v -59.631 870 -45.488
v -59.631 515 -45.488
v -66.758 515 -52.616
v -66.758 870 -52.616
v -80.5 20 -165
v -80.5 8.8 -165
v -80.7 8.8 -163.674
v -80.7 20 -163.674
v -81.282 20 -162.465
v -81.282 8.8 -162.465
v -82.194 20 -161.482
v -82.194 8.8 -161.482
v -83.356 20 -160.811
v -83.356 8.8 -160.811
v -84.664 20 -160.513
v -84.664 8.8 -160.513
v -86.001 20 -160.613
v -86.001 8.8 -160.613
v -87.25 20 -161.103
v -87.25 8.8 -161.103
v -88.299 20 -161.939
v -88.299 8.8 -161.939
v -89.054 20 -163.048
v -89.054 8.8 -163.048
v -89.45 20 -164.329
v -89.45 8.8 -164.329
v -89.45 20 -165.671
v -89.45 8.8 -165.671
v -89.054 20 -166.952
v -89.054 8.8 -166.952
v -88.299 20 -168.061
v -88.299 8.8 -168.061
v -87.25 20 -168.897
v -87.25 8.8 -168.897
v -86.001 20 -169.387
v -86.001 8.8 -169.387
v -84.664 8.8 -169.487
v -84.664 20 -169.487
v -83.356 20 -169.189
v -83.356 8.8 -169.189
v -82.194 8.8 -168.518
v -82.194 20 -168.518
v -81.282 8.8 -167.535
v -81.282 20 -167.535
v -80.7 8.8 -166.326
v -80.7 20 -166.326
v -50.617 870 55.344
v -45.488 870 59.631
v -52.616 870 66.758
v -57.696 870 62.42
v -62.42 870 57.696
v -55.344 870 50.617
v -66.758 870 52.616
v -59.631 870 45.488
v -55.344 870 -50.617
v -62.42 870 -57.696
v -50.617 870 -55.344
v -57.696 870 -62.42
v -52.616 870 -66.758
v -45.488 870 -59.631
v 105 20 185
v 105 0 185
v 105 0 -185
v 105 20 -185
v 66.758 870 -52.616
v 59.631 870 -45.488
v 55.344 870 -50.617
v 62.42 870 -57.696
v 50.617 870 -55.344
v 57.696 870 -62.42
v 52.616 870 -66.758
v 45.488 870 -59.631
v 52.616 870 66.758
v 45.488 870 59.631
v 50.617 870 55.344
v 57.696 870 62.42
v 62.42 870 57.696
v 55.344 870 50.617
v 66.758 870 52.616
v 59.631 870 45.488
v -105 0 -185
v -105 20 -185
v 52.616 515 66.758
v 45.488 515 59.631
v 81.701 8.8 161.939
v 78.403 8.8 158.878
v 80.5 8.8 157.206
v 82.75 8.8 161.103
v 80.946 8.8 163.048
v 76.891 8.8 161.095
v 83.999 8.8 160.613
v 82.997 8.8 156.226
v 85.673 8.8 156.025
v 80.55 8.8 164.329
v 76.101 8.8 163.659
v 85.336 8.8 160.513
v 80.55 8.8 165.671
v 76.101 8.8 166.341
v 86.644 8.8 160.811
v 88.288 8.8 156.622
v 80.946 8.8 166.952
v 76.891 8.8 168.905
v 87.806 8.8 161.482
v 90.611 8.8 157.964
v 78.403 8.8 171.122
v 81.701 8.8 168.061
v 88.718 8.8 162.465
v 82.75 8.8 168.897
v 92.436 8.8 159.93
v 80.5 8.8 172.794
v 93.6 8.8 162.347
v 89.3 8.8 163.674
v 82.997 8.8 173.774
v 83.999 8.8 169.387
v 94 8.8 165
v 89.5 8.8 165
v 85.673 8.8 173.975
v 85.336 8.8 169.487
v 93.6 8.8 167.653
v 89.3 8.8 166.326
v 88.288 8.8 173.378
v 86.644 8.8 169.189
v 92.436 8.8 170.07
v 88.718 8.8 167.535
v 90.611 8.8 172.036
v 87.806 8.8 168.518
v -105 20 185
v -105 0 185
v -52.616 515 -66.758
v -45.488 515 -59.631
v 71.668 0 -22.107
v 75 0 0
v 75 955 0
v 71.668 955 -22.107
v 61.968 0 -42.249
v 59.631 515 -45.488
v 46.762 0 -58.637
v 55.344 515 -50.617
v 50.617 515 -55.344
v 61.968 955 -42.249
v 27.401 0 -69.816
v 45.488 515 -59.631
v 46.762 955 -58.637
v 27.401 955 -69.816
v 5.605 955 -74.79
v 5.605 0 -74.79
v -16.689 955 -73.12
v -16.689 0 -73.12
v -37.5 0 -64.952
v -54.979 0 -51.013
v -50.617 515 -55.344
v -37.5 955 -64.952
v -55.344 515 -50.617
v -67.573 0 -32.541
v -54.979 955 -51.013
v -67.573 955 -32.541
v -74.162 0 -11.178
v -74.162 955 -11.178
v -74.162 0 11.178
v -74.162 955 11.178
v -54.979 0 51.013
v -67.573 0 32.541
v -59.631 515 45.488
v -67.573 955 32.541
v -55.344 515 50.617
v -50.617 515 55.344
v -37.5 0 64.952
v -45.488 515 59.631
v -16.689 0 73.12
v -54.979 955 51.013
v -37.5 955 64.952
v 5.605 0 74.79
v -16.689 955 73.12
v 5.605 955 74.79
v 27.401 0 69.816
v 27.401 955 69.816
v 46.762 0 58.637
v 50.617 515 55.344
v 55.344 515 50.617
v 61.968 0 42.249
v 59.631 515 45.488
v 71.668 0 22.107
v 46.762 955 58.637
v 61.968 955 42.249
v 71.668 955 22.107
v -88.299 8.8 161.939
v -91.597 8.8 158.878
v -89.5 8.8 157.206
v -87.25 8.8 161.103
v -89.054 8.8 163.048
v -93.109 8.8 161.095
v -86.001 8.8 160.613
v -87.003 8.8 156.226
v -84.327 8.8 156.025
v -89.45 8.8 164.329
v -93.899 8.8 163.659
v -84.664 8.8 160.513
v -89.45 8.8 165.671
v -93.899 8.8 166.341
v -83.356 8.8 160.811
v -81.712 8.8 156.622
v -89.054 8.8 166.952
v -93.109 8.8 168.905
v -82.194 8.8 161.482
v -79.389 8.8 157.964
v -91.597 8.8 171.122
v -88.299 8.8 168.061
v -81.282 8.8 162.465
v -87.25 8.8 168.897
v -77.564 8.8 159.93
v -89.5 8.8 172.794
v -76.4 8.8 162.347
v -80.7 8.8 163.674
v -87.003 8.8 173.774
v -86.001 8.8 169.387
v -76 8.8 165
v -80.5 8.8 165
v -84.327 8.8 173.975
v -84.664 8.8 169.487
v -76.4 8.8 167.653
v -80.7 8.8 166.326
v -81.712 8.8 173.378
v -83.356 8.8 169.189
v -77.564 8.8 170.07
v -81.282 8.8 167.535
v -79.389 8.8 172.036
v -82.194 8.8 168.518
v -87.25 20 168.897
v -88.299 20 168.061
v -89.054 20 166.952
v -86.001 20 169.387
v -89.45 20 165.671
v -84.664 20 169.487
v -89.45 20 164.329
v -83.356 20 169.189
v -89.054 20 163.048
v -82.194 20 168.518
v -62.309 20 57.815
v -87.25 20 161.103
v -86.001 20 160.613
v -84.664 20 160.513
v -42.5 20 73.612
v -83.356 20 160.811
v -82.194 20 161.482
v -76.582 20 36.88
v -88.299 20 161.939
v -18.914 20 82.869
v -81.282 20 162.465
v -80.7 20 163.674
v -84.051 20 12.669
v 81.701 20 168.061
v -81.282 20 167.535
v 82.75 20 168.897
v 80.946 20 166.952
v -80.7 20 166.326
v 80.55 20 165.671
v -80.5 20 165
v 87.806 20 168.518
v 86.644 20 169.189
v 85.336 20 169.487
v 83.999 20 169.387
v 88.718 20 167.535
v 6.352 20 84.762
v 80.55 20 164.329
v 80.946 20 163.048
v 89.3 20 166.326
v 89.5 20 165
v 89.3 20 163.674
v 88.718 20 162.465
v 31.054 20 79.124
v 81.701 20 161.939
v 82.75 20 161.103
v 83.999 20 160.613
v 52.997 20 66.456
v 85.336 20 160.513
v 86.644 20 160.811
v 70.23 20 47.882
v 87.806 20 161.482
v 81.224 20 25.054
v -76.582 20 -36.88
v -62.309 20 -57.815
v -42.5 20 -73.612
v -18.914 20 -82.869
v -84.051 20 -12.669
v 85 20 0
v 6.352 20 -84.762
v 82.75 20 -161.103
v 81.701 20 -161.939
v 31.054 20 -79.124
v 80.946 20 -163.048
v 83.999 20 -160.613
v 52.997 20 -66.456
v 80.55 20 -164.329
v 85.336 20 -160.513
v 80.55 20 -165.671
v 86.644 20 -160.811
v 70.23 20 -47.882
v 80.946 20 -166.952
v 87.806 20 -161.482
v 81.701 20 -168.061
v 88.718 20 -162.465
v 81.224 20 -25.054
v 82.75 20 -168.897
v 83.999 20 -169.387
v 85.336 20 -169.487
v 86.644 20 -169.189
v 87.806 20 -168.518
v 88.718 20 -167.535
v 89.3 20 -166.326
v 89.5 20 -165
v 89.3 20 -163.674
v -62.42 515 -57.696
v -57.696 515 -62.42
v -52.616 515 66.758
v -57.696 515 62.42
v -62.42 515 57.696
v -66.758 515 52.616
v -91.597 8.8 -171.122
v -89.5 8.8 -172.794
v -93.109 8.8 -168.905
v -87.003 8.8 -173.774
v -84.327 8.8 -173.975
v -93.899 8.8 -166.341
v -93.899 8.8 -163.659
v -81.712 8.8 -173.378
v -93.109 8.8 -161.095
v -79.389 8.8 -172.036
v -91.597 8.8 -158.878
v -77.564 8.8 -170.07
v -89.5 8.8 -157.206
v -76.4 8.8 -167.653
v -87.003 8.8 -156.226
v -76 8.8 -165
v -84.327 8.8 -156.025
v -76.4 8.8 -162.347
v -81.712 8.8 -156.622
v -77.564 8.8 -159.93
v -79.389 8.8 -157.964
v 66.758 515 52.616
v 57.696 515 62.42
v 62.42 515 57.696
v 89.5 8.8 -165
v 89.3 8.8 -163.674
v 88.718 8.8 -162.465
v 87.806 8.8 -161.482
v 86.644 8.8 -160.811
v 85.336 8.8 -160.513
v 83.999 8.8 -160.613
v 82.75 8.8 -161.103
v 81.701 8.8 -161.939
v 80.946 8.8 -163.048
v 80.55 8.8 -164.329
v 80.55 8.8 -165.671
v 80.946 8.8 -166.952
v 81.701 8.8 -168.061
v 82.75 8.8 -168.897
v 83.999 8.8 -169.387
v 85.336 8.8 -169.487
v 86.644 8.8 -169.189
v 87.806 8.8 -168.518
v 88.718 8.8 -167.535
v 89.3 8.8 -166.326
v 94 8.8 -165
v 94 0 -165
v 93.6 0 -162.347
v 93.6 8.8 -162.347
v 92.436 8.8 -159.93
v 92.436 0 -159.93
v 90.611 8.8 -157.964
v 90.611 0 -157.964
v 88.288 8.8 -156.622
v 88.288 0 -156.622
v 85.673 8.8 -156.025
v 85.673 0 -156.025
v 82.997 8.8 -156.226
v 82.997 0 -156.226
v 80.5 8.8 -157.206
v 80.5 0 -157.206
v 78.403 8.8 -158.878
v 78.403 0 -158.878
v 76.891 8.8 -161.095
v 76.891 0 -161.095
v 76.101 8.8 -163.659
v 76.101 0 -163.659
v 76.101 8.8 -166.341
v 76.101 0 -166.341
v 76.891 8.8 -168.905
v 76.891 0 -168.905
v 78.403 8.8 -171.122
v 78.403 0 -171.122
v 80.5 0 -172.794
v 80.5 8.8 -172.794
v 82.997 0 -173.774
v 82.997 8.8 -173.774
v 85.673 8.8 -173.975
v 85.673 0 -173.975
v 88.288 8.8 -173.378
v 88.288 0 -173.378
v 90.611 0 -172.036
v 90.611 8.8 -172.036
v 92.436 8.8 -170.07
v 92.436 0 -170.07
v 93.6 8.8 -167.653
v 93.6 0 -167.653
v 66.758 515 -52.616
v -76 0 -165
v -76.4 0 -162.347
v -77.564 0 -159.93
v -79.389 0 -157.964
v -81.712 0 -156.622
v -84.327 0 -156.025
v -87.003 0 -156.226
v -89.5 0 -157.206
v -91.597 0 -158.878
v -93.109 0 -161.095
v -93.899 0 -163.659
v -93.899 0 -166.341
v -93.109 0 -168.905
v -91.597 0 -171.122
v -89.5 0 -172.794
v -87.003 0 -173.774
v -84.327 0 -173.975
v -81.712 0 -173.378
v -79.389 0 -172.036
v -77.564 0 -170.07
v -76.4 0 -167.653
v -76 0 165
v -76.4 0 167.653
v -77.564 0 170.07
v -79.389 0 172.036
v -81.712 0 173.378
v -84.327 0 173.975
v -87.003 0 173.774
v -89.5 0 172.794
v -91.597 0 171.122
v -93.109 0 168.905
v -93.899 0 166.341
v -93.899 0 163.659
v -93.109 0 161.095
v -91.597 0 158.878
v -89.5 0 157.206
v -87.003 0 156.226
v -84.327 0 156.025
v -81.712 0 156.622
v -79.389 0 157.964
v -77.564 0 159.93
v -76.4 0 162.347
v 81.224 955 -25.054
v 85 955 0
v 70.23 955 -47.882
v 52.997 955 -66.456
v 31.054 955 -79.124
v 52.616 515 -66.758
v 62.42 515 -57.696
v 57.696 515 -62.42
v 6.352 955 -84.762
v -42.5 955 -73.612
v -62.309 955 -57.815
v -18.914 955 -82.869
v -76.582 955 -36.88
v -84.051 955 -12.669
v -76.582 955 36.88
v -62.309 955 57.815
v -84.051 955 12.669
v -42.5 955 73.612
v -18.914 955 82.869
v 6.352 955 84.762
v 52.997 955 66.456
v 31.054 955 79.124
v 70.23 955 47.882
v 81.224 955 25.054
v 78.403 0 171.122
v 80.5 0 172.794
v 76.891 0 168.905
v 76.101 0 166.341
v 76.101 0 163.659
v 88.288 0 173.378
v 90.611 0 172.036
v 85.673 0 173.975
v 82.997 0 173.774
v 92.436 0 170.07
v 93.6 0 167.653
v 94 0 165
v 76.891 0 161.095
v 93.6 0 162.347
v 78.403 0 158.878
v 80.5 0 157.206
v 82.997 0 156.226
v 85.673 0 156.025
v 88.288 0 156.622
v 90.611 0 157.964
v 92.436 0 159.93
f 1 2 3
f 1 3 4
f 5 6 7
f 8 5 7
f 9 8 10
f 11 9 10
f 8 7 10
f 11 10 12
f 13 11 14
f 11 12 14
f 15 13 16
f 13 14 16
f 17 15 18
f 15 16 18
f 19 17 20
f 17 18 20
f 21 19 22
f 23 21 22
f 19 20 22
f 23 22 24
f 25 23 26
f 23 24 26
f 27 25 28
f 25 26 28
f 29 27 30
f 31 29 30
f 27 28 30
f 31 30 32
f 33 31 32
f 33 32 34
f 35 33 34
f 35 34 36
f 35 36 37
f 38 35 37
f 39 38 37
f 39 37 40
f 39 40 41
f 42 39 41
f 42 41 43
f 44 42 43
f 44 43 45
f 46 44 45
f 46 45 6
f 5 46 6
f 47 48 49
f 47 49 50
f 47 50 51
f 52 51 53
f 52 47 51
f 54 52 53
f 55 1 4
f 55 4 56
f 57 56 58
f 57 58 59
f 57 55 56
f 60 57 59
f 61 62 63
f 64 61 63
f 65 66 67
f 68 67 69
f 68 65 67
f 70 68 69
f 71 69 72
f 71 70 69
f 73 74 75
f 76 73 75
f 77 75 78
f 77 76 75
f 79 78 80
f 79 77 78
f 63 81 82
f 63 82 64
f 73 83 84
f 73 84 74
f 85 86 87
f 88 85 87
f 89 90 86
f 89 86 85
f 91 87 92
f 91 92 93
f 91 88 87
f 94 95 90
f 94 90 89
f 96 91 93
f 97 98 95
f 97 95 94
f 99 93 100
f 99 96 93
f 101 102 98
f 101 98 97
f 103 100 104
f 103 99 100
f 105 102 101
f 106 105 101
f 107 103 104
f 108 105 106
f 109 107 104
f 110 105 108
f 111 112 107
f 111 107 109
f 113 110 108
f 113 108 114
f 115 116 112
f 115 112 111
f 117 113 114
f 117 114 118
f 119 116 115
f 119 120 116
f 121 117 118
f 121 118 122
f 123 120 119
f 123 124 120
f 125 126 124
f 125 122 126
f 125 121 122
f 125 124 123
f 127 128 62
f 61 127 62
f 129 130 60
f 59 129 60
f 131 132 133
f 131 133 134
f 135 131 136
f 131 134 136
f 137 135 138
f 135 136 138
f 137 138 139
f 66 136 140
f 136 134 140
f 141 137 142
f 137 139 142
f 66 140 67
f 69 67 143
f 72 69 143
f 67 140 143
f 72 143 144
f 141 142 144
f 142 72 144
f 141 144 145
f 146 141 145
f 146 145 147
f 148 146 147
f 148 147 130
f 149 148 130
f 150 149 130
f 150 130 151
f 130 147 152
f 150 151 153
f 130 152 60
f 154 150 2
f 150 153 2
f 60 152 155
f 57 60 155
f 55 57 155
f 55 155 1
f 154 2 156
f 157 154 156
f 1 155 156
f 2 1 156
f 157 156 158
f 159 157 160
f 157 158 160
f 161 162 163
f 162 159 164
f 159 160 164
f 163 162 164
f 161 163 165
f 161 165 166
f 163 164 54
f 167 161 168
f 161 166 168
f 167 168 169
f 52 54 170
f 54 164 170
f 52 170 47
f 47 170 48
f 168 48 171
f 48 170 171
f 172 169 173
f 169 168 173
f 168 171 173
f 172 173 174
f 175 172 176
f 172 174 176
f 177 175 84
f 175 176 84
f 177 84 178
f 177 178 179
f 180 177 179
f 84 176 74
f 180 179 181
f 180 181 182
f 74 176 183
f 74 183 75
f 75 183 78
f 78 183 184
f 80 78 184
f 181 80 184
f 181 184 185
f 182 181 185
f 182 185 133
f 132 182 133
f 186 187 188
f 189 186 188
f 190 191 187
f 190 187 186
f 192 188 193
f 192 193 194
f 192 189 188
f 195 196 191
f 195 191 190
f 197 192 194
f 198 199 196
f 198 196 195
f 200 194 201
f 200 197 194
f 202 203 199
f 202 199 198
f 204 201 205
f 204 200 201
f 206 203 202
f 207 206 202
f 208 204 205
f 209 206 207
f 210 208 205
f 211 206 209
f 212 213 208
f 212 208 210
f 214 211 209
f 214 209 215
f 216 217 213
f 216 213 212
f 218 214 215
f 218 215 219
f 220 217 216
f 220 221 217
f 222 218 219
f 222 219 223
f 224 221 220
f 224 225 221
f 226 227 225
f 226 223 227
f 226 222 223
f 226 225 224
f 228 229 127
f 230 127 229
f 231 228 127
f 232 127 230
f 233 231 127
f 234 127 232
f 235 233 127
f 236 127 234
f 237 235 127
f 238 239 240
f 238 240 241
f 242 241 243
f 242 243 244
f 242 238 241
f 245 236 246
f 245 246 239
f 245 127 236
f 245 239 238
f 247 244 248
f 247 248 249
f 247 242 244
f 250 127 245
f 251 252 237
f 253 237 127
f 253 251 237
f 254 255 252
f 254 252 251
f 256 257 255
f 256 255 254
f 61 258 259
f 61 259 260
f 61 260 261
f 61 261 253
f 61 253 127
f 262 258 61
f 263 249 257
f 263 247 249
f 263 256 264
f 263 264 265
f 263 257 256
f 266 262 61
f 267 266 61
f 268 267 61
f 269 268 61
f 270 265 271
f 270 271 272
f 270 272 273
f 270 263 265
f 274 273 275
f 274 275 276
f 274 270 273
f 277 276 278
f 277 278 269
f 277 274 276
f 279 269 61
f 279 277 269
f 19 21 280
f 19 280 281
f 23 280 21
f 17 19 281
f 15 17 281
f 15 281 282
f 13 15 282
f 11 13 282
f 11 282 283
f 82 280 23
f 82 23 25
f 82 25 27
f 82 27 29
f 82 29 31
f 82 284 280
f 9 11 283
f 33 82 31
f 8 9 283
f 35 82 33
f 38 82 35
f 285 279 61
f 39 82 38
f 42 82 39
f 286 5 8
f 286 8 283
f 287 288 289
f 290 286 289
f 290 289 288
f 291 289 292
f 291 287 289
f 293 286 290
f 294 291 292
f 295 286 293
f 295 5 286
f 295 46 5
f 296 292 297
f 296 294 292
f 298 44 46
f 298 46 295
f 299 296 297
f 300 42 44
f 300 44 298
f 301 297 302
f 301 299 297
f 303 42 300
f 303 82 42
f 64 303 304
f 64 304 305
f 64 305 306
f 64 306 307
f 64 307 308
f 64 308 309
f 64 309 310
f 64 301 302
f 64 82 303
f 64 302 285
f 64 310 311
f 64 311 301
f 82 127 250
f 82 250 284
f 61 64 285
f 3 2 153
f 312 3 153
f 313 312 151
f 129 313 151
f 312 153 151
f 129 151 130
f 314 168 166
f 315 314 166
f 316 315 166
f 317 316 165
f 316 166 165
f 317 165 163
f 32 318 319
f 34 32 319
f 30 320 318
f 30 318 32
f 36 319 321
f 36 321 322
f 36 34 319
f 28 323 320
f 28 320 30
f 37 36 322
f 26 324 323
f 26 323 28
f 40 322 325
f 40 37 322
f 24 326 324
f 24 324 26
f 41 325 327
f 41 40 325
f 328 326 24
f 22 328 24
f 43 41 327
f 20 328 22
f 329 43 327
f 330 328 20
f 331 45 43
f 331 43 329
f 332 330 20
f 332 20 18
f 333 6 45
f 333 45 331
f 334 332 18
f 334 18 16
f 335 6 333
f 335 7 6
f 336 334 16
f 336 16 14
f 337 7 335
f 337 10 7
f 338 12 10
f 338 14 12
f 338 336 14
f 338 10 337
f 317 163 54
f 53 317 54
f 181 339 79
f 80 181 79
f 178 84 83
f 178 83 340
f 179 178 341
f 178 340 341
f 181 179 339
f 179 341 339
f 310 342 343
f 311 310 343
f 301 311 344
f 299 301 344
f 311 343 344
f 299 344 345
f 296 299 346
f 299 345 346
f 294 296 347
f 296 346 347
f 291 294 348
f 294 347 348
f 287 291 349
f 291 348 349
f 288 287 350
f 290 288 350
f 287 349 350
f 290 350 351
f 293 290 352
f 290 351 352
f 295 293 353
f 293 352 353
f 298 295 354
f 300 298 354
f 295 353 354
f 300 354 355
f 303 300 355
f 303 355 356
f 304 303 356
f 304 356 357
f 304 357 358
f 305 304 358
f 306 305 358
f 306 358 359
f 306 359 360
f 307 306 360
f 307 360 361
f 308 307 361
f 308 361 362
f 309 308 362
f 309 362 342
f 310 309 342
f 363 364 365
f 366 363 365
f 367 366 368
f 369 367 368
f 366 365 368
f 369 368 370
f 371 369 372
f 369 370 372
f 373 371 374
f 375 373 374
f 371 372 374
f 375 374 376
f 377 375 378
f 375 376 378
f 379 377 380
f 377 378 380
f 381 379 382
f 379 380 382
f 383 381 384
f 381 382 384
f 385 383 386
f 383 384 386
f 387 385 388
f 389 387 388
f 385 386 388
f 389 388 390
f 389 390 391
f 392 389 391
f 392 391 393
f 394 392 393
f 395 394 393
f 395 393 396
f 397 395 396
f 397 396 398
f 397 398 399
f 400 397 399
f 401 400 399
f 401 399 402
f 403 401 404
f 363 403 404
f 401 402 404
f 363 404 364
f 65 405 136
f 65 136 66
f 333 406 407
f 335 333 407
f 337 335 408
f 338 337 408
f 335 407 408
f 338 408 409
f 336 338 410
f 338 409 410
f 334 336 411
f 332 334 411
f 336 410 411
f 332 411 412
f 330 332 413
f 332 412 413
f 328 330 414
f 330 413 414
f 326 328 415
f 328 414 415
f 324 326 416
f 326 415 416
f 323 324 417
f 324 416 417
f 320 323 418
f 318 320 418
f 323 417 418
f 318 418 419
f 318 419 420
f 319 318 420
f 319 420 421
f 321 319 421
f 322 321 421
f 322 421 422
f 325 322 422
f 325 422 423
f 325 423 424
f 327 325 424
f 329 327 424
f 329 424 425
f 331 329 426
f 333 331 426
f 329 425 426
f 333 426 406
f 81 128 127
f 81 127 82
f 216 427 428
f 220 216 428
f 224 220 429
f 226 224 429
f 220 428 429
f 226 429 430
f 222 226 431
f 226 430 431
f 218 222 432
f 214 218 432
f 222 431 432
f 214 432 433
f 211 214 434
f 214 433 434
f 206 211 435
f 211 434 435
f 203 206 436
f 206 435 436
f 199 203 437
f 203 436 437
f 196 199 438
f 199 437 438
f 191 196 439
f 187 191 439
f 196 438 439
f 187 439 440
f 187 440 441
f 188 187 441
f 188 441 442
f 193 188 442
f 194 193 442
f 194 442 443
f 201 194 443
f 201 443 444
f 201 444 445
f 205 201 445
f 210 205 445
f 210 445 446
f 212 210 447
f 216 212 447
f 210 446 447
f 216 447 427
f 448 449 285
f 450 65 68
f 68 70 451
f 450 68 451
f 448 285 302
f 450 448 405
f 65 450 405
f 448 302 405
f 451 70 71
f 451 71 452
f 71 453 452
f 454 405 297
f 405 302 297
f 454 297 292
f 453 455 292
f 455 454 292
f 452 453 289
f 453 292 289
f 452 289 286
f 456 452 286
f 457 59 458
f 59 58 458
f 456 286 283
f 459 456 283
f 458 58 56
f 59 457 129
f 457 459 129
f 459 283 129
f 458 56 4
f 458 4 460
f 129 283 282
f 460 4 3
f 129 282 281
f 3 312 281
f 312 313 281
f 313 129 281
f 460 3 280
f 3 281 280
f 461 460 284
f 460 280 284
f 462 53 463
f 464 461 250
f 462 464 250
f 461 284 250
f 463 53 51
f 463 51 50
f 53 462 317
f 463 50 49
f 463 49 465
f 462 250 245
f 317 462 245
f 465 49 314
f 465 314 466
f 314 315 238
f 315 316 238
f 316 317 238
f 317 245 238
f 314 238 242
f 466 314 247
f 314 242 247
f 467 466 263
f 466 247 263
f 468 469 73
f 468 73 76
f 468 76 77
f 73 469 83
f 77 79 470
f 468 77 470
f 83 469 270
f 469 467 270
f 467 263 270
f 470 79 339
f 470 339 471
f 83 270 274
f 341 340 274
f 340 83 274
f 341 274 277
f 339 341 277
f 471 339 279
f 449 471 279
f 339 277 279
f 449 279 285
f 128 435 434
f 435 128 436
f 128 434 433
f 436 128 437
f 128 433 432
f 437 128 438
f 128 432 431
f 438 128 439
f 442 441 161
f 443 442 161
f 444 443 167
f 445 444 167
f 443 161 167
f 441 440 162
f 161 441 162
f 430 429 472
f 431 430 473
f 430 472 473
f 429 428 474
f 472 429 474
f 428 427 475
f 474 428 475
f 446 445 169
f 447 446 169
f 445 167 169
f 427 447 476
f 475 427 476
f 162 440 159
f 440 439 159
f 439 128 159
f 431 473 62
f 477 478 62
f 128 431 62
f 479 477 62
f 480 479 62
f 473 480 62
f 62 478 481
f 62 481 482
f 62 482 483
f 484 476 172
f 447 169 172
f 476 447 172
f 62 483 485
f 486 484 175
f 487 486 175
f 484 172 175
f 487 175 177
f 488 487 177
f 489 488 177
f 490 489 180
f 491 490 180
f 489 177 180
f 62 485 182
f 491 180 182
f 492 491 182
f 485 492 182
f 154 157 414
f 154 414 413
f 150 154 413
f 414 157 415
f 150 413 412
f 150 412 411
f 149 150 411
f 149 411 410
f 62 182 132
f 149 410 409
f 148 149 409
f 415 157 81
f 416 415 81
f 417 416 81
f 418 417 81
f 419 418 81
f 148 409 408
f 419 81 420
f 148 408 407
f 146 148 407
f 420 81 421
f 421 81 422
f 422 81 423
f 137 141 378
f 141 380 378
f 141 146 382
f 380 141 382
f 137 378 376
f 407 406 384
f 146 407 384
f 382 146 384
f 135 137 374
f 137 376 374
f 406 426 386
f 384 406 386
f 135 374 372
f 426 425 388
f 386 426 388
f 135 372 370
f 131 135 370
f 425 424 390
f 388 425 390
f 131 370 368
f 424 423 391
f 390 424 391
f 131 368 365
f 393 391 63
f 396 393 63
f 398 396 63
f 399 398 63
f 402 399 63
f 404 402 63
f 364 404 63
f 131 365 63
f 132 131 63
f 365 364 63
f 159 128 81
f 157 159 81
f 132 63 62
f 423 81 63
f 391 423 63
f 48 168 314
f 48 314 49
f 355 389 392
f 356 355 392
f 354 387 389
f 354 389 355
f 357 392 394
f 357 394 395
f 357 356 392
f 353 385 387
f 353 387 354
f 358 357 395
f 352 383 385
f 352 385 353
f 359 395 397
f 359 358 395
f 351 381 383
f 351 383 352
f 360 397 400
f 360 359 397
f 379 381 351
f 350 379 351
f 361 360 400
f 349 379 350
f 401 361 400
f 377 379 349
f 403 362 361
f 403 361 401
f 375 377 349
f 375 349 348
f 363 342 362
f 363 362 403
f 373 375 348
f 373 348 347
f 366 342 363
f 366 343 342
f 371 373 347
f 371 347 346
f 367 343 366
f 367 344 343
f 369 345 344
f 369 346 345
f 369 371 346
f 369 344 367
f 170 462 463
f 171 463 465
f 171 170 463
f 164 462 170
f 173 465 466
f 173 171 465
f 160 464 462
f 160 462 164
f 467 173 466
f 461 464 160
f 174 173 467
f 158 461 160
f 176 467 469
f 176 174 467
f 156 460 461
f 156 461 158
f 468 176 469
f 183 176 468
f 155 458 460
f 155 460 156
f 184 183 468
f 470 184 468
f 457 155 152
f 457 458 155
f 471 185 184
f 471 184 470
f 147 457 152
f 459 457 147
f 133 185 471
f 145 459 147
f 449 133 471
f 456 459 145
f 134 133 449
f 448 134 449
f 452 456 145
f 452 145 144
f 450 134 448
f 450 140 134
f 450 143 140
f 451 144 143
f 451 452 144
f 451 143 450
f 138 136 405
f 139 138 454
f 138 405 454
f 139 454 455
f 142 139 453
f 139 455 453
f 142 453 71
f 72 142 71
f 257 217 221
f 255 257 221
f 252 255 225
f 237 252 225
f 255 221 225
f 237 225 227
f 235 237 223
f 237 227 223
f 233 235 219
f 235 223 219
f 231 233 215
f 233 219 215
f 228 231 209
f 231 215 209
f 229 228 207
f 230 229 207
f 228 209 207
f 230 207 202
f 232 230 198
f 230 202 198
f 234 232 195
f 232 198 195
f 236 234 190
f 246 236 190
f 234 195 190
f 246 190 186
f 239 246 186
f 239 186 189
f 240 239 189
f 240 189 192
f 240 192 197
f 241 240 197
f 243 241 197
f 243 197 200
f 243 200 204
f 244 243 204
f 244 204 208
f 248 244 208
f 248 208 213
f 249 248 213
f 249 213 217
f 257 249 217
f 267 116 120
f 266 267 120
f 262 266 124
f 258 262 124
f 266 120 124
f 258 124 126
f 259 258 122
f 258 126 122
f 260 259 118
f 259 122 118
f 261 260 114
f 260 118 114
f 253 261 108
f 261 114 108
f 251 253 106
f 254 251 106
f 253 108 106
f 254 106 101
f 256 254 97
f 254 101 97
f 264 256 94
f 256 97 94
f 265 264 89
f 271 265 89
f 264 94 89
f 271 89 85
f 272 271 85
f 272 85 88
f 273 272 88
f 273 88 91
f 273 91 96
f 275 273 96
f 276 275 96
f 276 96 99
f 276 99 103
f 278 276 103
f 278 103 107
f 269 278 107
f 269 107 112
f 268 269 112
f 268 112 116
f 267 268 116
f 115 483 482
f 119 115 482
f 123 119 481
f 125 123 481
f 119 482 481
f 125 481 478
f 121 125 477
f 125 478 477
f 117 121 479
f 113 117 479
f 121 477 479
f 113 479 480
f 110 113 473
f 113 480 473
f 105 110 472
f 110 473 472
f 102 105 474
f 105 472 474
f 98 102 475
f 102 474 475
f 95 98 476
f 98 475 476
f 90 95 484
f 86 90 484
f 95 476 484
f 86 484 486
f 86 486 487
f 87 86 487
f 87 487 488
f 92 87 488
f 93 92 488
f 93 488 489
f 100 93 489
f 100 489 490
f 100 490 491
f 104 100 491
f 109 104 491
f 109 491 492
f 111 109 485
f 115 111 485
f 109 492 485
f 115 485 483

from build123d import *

# Parameters (mm, degrees)
SKETCH1_W           = 210
SKETCH1_H           = 370
BOSS_EXTRUDE1_DEPTH = 20
SKETCH2_R           = 85
BOSS_EXTRUDE2_DEPTH = 935
SKETCH3_R           = 75
CUT_EXTRUDE1_DEPTH  = 956
SKETCH4_R           = 4.5
CUT_EXTRUDE2_DEPTH  = 956
SKETCH5_R           = 9
CUT_EXTRUDE3_DEPTH  = 8.8
SKETCH7_W           = 20
SKETCH7_H           = 355
CUT_EXTRUDE4_DEPTH  = 291.060966544
SKETCH8_W           = 20
SKETCH8_H           = 355
CUT_EXTRUDE5_DEPTH  = 291.060966544


with BuildPart() as part:
    # Sketch1 → Boss-Extrude1 (new body)
    with BuildSketch(Plane(origin=(0, 0, 0), x_dir=(1, 0, 0), z_dir=(0, 1, 0))):
        Rectangle(SKETCH1_W, SKETCH1_H)
    extrude(amount=BOSS_EXTRUDE1_DEPTH)

    # Sketch2 → Boss-Extrude2 (add)
    with BuildSketch(Plane(origin=(0, 20, 0), x_dir=(1, 0, 0), z_dir=(0, 1, 0))):
        Circle(SKETCH2_R)
    extrude(amount=BOSS_EXTRUDE2_DEPTH)

    # Sketch3 → Cut-Extrude1 (cut, through all)
    with BuildSketch(Plane(origin=(0, 955, 0), x_dir=(1, 0, 0), z_dir=(0, 1, 0))):
        Circle(SKETCH3_R)
    extrude(amount=-CUT_EXTRUDE1_DEPTH, mode=Mode.SUBTRACT)

    # Sketch4 → Cut-Extrude2 (cut, through all)
    with BuildSketch(Plane.XZ):
        with Locations((-85, 165)):
            Circle(SKETCH4_R)
        with Locations((85, 165)):
            Circle(SKETCH4_R)
        with Locations((85, -165)):
            Circle(SKETCH4_R)
        with Locations((-85, -165)):
            Circle(SKETCH4_R)
    extrude(amount=-CUT_EXTRUDE2_DEPTH, mode=Mode.SUBTRACT)

    # Sketch5 → Cut-Extrude3 (cut)
    with BuildSketch(Plane.XZ):
        with Locations((-85, 165)):
            Circle(SKETCH5_R)
        with Locations((85, 165)):
            Circle(SKETCH5_R)
        with Locations((85, -165)):
            Circle(SKETCH5_R)
        with Locations((-85, -165)):
            Circle(SKETCH5_R)
    extrude(amount=-CUT_EXTRUDE3_DEPTH, mode=Mode.SUBTRACT)

    # Sketch7 → Cut-Extrude4 (cut, through all)
    with BuildSketch(Plane(origin=(60.104076401, 0, 60.104076401), x_dir=(0.707106781, 0, -0.707106781), z_dir=(0.707106781, 0, 0.707106781))):
        with Locations((0, 692.5)):
            Rectangle(SKETCH7_W, SKETCH7_H)
    extrude(amount=-CUT_EXTRUDE4_DEPTH, mode=Mode.SUBTRACT)

    # Sketch8 → Cut-Extrude5 (cut, through all)
    with BuildSketch(Plane(origin=(60.104076401, 0, -60.104076401), x_dir=(-0.707106781, 0, -0.707106781), z_dir=(0.707106781, 0, -0.707106781))):
        with Locations((0, 692.5)):
            Rectangle(SKETCH8_W, SKETCH8_H)
    extrude(amount=-CUT_EXTRUDE5_DEPTH, mode=Mode.SUBTRACT)


solid = part.part
